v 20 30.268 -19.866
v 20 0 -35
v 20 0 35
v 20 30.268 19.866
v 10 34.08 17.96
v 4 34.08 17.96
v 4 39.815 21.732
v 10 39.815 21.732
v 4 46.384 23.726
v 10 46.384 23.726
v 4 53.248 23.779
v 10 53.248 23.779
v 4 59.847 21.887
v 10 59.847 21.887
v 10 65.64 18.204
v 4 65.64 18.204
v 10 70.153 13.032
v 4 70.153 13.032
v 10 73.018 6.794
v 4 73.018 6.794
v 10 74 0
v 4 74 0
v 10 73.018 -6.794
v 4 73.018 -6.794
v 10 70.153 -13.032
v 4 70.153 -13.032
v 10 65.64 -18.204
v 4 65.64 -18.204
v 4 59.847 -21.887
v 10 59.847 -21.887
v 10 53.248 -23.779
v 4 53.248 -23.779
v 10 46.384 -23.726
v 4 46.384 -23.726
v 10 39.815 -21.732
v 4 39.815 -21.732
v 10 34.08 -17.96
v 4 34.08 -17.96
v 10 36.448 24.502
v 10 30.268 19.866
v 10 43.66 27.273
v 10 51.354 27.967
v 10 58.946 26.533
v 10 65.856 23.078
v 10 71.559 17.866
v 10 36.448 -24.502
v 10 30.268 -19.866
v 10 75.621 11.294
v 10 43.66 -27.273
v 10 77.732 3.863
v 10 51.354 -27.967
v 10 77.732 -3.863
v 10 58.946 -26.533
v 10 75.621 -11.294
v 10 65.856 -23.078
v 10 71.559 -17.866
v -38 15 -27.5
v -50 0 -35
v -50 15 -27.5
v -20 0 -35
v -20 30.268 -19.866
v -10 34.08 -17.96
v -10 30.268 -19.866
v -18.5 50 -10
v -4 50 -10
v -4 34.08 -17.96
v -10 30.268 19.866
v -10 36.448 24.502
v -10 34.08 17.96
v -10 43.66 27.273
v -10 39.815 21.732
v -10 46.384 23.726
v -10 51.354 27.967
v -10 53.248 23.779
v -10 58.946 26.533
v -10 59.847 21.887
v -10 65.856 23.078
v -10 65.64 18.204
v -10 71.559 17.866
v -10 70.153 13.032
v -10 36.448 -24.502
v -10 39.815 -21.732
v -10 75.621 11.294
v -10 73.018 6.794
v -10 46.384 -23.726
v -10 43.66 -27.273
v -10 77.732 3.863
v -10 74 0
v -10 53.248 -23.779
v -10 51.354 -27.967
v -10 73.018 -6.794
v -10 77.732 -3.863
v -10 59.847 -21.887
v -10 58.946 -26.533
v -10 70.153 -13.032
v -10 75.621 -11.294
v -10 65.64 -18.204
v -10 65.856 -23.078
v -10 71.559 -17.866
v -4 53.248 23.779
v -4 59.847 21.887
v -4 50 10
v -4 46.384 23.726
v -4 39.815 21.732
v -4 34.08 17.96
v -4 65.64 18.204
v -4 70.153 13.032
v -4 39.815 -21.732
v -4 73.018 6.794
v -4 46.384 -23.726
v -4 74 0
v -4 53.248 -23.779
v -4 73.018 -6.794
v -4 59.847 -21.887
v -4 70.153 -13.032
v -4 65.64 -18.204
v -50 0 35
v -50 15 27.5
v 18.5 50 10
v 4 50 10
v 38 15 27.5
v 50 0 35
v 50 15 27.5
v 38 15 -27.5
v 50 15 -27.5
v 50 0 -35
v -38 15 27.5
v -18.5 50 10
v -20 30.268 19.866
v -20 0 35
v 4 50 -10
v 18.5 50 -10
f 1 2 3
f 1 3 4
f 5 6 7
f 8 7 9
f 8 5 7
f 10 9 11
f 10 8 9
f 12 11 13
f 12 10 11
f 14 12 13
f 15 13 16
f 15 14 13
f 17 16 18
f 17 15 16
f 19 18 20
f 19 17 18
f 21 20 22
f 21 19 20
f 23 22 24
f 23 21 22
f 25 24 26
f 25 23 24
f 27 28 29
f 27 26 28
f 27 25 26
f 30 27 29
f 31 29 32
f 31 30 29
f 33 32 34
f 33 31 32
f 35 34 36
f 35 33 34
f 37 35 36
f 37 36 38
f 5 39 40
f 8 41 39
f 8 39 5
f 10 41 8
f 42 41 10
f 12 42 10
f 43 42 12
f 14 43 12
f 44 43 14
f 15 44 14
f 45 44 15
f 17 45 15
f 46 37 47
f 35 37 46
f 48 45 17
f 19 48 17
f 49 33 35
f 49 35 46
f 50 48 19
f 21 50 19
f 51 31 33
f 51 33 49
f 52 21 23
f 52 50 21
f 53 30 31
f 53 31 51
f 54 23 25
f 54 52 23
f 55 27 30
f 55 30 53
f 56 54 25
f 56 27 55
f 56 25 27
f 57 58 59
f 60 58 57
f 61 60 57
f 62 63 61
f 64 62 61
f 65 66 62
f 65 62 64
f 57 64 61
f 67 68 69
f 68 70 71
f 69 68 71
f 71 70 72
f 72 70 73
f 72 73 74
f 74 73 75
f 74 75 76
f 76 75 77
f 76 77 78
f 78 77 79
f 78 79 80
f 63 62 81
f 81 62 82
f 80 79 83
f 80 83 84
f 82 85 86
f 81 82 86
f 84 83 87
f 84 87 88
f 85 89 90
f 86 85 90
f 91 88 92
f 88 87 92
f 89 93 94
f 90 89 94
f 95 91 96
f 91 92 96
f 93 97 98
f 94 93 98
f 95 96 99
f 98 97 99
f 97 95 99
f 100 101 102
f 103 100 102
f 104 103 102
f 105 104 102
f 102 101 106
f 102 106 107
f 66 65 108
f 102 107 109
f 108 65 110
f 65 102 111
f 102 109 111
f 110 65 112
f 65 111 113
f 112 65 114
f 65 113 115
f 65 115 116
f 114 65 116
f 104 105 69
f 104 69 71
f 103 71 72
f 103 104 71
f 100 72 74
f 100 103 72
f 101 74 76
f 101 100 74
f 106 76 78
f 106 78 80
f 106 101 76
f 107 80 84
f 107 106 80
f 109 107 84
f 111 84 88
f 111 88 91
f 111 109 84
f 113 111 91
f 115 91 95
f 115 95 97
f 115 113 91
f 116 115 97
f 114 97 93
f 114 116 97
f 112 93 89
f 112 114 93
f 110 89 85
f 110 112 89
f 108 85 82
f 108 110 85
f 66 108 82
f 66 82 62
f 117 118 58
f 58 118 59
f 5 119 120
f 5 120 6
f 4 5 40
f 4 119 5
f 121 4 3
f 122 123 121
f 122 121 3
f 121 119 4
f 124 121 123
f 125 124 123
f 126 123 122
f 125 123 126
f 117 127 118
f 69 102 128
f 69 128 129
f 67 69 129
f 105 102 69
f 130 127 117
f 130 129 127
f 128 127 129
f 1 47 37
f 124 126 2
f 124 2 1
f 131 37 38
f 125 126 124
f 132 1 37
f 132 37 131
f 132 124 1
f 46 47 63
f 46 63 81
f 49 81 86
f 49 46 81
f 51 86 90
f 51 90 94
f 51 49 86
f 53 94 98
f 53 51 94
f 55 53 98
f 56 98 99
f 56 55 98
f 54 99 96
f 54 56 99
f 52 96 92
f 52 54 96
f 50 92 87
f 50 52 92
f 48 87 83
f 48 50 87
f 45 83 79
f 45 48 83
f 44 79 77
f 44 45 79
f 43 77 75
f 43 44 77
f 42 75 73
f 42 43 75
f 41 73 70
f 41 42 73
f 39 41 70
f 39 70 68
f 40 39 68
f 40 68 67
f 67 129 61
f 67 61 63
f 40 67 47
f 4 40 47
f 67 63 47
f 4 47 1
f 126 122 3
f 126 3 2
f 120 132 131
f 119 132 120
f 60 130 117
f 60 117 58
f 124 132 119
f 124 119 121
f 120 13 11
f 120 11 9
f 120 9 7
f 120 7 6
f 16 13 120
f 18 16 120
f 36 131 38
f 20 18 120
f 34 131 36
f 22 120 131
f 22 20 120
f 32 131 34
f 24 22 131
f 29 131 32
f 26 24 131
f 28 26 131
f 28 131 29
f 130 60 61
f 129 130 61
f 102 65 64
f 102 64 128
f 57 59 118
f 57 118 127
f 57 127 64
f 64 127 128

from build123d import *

# Parameters (mm, degrees)
BOSS_EXTRUDE1_DEPTH     = 50
BOSS_EXTRUDE2_DEPTH     = 10
BOSS_EXTRUDE3_DEPTH     = 4
SKETCH3_W               = 40
SKETCH3_H               = 30.268164841
CUT_EXTRUDE1_DEPTH      = 36
CUT_EXTRUDE1_DEPTH_BACK = 36


with BuildPart() as part:
    # Sketch2 → Boss-Extrude1 (new body, symmetric)
    with BuildSketch(Plane(origin=(0, 0, 0), x_dir=(0, 0, -1), z_dir=(1, 0, 0))):
        Polygon((-35, 0), (35, 0), (10, 50), (-10, 50), align=None)
    extrude(amount=BOSS_EXTRUDE1_DEPTH, both=True)

    # Sketch2<5> → Boss-Extrude2 (add, symmetric)
    with BuildSketch(Plane(origin=(0, 0, 0), x_dir=(0, 0, -1), z_dir=(1, 0, 0))):
        with BuildLine():
            ThreePointArc((19.865917579, 30.268164841), (0, 78), (-19.865917579, 30.268164841))
            Line((-19.865917579, 30.268164841), (-17.959919678, 34.080160643))
            ThreePointArc((-17.959919678, 34.080160643), (0, 74), (17.959919678, 34.080160643))
            Line((17.959919678, 34.080160643), (19.865917579, 30.268164841))
        make_face()
    extrude(amount=BOSS_EXTRUDE2_DEPTH, both=True)

    # Sketch2<6> → Boss-Extrude3 (add, symmetric)
    with BuildSketch(Plane(origin=(0, 0, 0), x_dir=(0, 0, -1), z_dir=(1, 0, 0))):
        Polygon((-35, 0), (35, 0), (10, 50), (-10, 50), align=None)
        with BuildLine():
            Line((-19.865917579, 30.268164841), (19.865917579, 30.268164841))
            ThreePointArc((19.865917579, 30.268164841), (0, 78), (-19.865917579, 30.268164841))
        make_face()
    extrude(amount=BOSS_EXTRUDE3_DEPTH, both=True)

    # Sketch3 → Cut-Extrude1 (cut, two sides)
    with BuildSketch(Plane.XY) as cut_extrude1_sk:
        Polygon((38, 15), (50, 15), (50, 50), (18.5, 50), align=None)
        with Locations((0, 15.134082421)):
            Rectangle(SKETCH3_W, SKETCH3_H)
        Polygon((-38, 15), (-18.5, 50), (-50, 50), (-50, 15), align=None)
    extrude(amount=CUT_EXTRUDE1_DEPTH, mode=Mode.SUBTRACT)
    extrude(cut_extrude1_sk.sketch, amount=-CUT_EXTRUDE1_DEPTH_BACK, mode=Mode.SUBTRACT)


solid = part.part
